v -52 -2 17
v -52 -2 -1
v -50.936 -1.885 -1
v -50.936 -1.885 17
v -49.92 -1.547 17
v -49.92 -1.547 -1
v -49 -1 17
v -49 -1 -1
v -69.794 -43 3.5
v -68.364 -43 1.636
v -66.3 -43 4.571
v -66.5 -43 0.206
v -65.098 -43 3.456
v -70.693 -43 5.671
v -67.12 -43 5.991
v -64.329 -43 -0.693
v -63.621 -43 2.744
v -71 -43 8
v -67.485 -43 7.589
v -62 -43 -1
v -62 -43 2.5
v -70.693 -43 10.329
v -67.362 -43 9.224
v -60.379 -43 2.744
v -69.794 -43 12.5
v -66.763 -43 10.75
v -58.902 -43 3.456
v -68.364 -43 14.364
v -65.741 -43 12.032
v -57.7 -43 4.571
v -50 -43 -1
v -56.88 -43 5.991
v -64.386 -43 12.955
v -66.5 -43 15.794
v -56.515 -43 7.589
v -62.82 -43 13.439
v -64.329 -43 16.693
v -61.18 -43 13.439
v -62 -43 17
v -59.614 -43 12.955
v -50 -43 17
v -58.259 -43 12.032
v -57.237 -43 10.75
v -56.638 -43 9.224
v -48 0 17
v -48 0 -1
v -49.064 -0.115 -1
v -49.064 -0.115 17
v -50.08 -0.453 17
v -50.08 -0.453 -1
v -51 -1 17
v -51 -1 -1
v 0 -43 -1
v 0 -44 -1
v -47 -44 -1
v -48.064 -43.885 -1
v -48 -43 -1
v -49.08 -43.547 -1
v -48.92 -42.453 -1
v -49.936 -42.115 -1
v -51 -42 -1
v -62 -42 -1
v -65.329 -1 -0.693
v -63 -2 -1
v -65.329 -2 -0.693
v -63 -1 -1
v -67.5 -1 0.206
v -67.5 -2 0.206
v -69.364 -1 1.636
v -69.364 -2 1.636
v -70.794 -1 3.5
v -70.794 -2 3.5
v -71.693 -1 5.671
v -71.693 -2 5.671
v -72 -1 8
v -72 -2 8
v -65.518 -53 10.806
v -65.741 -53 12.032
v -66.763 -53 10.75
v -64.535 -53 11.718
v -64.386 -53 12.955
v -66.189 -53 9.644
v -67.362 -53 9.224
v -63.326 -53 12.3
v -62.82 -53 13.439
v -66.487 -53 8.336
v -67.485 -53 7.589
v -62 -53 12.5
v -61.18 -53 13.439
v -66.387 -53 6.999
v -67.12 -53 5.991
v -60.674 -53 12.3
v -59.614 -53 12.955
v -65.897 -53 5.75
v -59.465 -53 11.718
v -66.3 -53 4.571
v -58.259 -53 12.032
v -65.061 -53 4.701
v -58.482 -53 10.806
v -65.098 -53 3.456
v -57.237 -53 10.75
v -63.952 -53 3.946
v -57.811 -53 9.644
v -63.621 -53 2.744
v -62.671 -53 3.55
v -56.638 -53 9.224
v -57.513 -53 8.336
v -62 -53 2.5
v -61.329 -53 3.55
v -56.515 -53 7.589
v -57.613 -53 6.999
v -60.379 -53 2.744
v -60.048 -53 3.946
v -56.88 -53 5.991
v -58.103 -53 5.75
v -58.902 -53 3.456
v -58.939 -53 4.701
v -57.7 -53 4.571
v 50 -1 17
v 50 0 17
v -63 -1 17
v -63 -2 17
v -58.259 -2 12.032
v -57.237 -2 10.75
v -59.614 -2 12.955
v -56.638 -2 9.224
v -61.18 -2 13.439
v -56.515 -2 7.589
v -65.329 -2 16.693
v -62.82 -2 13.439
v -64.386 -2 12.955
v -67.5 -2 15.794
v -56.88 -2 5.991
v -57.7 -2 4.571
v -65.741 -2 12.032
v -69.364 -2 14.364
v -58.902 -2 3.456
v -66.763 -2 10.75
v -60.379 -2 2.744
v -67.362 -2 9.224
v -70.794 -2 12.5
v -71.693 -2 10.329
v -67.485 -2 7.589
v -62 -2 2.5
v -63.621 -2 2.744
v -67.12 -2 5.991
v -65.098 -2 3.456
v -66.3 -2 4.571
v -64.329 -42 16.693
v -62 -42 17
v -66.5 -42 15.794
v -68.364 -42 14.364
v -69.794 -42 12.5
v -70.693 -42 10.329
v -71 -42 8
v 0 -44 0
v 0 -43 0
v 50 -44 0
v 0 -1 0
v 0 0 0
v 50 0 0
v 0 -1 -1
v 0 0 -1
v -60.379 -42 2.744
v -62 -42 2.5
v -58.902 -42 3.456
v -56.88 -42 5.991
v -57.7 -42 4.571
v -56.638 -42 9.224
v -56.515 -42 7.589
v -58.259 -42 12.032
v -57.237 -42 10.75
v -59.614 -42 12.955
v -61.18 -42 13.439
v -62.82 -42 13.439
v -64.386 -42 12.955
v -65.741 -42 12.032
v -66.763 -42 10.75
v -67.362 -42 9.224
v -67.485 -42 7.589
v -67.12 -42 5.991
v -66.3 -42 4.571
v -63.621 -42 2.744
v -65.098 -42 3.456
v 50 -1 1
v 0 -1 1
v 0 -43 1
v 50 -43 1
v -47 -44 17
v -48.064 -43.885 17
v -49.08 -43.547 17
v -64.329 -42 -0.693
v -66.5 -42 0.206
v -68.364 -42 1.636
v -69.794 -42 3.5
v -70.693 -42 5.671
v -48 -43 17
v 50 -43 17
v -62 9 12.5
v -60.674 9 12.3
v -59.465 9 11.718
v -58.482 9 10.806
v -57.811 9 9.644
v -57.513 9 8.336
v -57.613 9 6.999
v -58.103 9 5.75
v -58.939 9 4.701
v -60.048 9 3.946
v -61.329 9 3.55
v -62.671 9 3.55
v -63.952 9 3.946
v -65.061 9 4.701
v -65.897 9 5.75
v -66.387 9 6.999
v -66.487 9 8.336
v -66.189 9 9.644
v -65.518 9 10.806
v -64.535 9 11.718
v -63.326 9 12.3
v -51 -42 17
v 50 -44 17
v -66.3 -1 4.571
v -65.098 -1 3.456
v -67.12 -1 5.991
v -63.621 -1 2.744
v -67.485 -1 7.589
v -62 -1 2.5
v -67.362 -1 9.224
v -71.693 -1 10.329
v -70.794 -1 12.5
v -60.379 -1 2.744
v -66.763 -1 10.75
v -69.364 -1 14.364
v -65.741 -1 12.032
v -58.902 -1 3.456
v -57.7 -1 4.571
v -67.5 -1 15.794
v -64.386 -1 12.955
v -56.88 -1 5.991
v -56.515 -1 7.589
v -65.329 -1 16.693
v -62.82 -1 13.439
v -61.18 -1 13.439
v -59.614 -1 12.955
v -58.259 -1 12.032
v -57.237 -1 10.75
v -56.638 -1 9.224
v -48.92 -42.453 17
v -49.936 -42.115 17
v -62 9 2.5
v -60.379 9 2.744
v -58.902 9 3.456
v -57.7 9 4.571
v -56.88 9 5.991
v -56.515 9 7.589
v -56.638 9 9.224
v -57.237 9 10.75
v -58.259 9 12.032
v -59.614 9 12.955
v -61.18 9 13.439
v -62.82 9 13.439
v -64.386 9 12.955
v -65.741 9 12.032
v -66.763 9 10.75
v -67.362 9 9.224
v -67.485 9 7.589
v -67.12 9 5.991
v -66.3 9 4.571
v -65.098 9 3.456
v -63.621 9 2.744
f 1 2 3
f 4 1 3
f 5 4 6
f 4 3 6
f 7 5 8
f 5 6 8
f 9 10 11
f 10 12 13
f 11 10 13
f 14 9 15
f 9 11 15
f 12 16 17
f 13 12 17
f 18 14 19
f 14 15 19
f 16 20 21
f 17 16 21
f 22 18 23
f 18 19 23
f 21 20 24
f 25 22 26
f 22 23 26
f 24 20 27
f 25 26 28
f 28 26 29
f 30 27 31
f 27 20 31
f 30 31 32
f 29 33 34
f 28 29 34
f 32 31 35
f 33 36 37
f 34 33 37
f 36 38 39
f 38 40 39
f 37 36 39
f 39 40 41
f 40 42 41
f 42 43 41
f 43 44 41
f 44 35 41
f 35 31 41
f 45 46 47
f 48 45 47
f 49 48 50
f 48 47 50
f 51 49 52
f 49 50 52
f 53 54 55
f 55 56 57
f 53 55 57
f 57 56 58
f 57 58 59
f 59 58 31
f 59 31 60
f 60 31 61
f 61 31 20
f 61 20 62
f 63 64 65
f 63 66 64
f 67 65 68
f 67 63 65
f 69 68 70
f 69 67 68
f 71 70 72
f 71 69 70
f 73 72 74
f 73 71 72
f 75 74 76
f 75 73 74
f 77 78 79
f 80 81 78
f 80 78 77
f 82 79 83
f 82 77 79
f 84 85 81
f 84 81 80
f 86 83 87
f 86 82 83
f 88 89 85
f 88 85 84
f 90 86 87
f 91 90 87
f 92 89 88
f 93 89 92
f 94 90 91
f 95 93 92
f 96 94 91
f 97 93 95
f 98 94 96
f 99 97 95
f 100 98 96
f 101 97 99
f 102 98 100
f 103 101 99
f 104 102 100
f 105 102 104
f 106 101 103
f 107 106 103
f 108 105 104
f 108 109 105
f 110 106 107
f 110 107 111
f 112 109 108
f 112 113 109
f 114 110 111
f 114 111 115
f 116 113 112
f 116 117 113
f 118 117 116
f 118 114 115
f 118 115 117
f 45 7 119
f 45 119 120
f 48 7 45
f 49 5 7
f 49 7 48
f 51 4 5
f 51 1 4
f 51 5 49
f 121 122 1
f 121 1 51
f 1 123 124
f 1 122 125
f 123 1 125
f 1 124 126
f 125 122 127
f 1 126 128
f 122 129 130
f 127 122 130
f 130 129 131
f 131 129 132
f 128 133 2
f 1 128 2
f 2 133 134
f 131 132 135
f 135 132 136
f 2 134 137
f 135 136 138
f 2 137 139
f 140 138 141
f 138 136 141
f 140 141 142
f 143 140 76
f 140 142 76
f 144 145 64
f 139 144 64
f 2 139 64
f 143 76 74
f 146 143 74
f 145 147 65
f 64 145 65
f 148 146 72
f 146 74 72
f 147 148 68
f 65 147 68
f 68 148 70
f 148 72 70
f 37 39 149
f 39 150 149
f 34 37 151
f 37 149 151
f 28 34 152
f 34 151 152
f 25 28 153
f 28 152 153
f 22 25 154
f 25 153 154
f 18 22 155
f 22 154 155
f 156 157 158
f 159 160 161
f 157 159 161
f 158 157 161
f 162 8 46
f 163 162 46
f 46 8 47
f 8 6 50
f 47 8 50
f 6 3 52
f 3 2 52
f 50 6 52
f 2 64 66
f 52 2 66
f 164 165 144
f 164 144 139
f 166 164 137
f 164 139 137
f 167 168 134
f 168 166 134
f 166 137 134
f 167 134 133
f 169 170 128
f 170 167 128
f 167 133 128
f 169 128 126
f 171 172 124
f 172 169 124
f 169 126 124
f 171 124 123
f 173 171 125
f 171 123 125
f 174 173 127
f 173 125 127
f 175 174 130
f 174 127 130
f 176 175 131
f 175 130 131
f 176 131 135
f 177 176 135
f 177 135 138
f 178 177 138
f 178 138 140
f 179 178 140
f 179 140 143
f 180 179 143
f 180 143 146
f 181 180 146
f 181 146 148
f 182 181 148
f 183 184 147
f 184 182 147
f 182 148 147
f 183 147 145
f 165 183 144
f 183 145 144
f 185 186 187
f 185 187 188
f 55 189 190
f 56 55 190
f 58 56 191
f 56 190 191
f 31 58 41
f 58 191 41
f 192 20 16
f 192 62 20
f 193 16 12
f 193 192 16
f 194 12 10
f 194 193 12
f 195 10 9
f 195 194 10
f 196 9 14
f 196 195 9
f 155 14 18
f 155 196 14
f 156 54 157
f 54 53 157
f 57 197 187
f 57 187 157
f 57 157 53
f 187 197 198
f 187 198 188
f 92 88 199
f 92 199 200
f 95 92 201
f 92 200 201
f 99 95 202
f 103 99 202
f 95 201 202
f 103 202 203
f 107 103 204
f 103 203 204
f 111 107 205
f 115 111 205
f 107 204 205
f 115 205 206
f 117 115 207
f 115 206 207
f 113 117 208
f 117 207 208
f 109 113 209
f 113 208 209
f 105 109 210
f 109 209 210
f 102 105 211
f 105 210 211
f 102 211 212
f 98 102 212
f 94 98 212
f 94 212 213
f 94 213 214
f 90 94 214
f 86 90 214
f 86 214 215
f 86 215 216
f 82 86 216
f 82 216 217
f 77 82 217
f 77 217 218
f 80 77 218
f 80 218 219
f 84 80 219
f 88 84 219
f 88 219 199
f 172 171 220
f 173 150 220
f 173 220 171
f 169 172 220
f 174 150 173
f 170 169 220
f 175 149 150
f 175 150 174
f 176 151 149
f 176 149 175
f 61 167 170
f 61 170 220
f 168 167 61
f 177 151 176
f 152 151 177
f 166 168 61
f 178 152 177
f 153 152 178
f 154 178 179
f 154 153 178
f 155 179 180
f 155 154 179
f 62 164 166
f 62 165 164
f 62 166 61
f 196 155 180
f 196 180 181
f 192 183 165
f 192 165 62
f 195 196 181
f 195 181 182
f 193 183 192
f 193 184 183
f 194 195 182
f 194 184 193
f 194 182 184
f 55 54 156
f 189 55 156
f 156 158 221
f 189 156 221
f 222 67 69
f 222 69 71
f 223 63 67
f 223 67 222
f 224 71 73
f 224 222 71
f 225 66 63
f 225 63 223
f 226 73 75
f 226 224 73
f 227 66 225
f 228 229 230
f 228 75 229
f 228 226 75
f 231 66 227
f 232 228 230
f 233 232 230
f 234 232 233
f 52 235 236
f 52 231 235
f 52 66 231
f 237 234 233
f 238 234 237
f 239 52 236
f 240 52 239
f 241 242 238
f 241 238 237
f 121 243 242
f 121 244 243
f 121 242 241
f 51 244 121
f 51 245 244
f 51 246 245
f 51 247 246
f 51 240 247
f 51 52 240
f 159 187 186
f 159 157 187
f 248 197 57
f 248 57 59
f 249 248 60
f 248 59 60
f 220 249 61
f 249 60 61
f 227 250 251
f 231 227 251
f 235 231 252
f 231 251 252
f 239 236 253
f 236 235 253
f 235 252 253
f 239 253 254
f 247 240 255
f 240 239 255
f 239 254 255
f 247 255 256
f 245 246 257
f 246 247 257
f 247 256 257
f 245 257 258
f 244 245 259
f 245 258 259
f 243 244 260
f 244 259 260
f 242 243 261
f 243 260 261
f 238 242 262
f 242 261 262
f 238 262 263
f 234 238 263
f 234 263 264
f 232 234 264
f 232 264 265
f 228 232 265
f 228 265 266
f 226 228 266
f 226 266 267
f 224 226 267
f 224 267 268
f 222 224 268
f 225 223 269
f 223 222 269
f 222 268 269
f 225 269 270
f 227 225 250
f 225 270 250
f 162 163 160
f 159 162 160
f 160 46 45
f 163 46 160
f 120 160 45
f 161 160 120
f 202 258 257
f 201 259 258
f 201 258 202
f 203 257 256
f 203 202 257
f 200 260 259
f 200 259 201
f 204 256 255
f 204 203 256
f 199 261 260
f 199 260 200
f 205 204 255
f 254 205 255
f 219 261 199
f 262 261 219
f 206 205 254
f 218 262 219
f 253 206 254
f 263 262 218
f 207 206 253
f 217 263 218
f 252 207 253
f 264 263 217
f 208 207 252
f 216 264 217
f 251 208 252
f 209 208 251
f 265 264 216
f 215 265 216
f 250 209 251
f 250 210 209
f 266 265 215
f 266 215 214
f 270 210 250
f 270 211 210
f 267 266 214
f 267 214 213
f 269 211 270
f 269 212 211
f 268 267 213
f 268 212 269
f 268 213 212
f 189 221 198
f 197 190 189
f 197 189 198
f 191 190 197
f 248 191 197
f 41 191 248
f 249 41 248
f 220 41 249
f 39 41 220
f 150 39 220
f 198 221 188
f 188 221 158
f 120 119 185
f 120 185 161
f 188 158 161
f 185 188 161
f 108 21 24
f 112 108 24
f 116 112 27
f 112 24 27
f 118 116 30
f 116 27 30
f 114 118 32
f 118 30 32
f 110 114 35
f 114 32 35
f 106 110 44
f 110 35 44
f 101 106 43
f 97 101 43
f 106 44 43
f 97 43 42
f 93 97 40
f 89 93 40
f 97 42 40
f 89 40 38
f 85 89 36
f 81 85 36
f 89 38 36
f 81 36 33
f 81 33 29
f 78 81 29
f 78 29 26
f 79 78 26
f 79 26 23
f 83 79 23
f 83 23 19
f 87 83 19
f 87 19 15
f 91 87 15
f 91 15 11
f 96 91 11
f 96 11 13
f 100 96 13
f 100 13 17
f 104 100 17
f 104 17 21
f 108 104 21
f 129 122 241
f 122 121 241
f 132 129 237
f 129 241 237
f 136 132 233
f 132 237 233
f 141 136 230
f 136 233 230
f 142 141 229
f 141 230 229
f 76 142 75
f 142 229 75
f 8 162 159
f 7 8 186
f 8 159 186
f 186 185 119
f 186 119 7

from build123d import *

# Parameters (mm, degrees)
CROQUIS1_W                    = 50
CROQUIS1_H                    = 44
SALIENTE_EXTRUIR1_DEPTH       = 1
CROQUIS2_W                    = 50
CROQUIS2_H                    = 1
SALIENTE_EXTRUIR2_DEPTH       = 16
CROQUIS3_W                    = 1
CROQUIS3_H                    = 1
SALIENTE_EXTRUIR3_DEPTH       = 50
CROQUIS4_W                    = 1
CROQUIS4_H                    = 18
SALIENTE_EXTRUIR4_DEPTH       = 1
CROQUIS6_W                    = 1
CROQUIS6_H                    = 18
SALIENTE_EXTRUIR5_DEPTH       = 1
CROQUIS12_W                   = 1
CROQUIS12_H                   = 18
SALIENTE_EXTRUIR11_DEPTH      = 1
CROQUIS13_W                   = 18
CROQUIS13_H                   = 1
SALIENTE_EXTRUIR12_DEPTH      = 21
CROQUIS14_W                   = 18
CROQUIS14_H                   = 1
SALIENTE_EXTRUIR13_DEPTH      = 21
REDONDEO4_R                   = 9
REDONDEO5_R                   = 9
CROQUIS15_W                   = 18
CROQUIS15_H                   = 1
SALIENTE_EXTRUIR14_DEPTH      = 1
CROQUIS16_W                   = 18
CROQUIS16_H                   = 1
SALIENTE_EXTRUIR15_DEPTH      = 1
REDONDEO6_R                   = 5
REDONDEO7_R                   = 5
SALIENTE_EXTRUIR22_DEPTH      = 10
SALIENTE_EXTRUIR22_DEPTH_BACK = 54
CROQUIS17_R                   = 5.5
CORTAR_EXTRUIR5_START         = -2
CROQUIS25_R                   = 5.5
CORTAR_EXTRUIR5_DEPTH         = 2
CROQUIS26_R                   = 4.5
CORTAR_EXTRUIR6_DEPTH         = 97.524608261


# Some blends are built 0.0001 mm under size
with BuildPart() as part:
    # Croquis1 → Saliente-Extruir1 (new body)
    with BuildSketch(Plane.XY):
        with Locations((25, -22)):
            Rectangle(CROQUIS1_W, CROQUIS1_H)
    extrude(amount=SALIENTE_EXTRUIR1_DEPTH)

    # Croquis2 → Saliente-Extruir2 (add)
    with BuildSketch(Plane.XY.offset(1)):
        with Locations((25, -0.5)):
            Rectangle(CROQUIS2_W, CROQUIS2_H)
        with Locations((25, -43.5)):
            Rectangle(CROQUIS2_W, CROQUIS2_H)
    extrude(amount=SALIENTE_EXTRUIR2_DEPTH)

    # Croquis3 → Saliente-Extruir3 (add)
    with BuildSketch(Plane.ZY):
        Polygon((0, -44), (17, -44), (17, -43), (1, -43), (0, -43), align=None)
        with Locations((-0.5, -43.5)):
            Rectangle(CROQUIS3_W, CROQUIS3_H)
        with Locations((-0.5, -0.5)):
            Rectangle(CROQUIS3_W, CROQUIS3_H)
        Polygon((0, 0), (0, -1), (1, -1), (17, -1), (17, 0), align=None)
    extrude(amount=SALIENTE_EXTRUIR3_DEPTH)



with BuildPart() as body_2:
    # Croquis4 → Saliente-Extruir4 (new body)
    with BuildSketch(Plane.XZ.offset(1)):
        with Locations((-50.5, 8)):
            Rectangle(CROQUIS4_W, CROQUIS4_H)
    extrude(amount=SALIENTE_EXTRUIR4_DEPTH)


with BuildPart() as part_1:
    add(part.part)

    add(body_2.part)  # Saliente-Extruir5 merges body 2
    # Croquis6 → Saliente-Extruir5 (add)
    with BuildSketch(Plane(origin=(0, -1, 0), x_dir=(1, 0, 0), z_dir=(0, 1, 0))):
        with Locations((-50.5, -8)):
            Rectangle(CROQUIS6_W, CROQUIS6_H)
    extrude(amount=SALIENTE_EXTRUIR5_DEPTH)

    # Croquis12 → Saliente-Extruir11 (add)
    with BuildSketch(Plane(origin=(0, -43, 0), x_dir=(1, 0, 0), z_dir=(0, 1, 0))):
        with Locations((-49.5, -8)):
            Rectangle(CROQUIS12_W, CROQUIS12_H)
    extrude(amount=SALIENTE_EXTRUIR11_DEPTH)

    # Croquis13 → Saliente-Extruir12 (add)
    with BuildSketch(Plane.ZY.offset(50)):
        with Locations((8, -42.5)):
            Rectangle(CROQUIS13_W, CROQUIS13_H)
    extrude(amount=SALIENTE_EXTRUIR12_DEPTH)

    # Croquis14 → Saliente-Extruir13 (add)
    with BuildSketch(Plane.ZY.offset(51)):
        with Locations((8, -1.5)):
            Rectangle(CROQUIS14_W, CROQUIS14_H)
    extrude(amount=SALIENTE_EXTRUIR13_DEPTH)

    # Redondeo4
    redondeo4_edges = [part_1.edges().sort_by_distance(p)[0] for p in [
        (-72, -1.5, -1),
        (-72, -1.5, 17),
    ]]
    fillet(redondeo4_edges, radius=REDONDEO4_R - 0.0001)  # a hair under: the kernel refuses the full size

    # Redondeo5
    redondeo5_edges = [part_1.edges().sort_by_distance(p)[0] for p in [
        (-71, -42.5, -1),
        (-71, -42.5, 17),
    ]]
    fillet(redondeo5_edges, radius=REDONDEO5_R - 0.0001)  # a hair under: the kernel refuses the full size

    # Croquis15 → Saliente-Extruir14 (add)
    with BuildSketch(Plane(origin=(-49, 0, 0), x_dir=(0, 0, -1), z_dir=(1, 0, 0))):
        with Locations((-8, -42.5)):
            Rectangle(CROQUIS15_W, CROQUIS15_H)
    extrude(amount=SALIENTE_EXTRUIR14_DEPTH)

    # Croquis16 → Saliente-Extruir15 (add)
    with BuildSketch(Plane(origin=(-50, 0, 0), x_dir=(0, 0, -1), z_dir=(1, 0, 0))):
        with Locations((-8, -1.5)):
            Rectangle(CROQUIS16_W, CROQUIS16_H)
    extrude(amount=SALIENTE_EXTRUIR15_DEPTH)

    # Redondeo6
    # the kernel refuses this fillet: 5 mm, written as the material it takes off along each edge
    with BuildSketch(Plane(origin=(-48, -42, -8.5), x_dir=(-1, 0, 0), z_dir=(0, 0, 1))) as redondeo6_piece_1:
        with BuildLine():
            CenterArc((3, 5), REDONDEO6_R, 233.130102354, 36.869897646)
            Line((0, 1), (-0.06, 0.92))
            ThreePointArc((-0.06, 0.92), (-0.1, 0.5), (-0.1, 0))
            Line((-0.1, 0), (0, -0.1))
            Line((0, -0.1), (3, -0.1))
            Line((3, -0.1), (3, 0))
        make_face()
    extrude(amount=33, mode=Mode.SUBTRACT)
    with BuildSketch(Plane(origin=(-49, -2, -8.5), x_dir=(0, 1, 0), z_dir=(0, 0, 1))) as redondeo6_piece_2:
        with BuildLine():
            CenterArc((5, 3), REDONDEO6_R, 180, 36.869897646)
            Line((0, 3), (-0.1, 3))
            Line((-0.1, 3), (-0.1, 0))
            Line((-0.1, 0), (0, -0.1))
            ThreePointArc((0, -0.1), (0.5, -0.1), (0.92, -0.06))
            Line((0.92, -0.06), (1, 0))
        make_face()
    extrude(amount=33, mode=Mode.SUBTRACT)

    # Redondeo7
    # the kernel refuses this fillet: 5 mm, written as the material it takes off along each edge
    with BuildSketch(Plane(origin=(-50, -44, 24.5), x_dir=(1, 0, 0), z_dir=(0, 0, -1)), Plane(origin=(-51, 0, -8.5), x_dir=(1, 0, 0), z_dir=(0, 0, 1))) as redondeo7_piece_1:
        with BuildLine():
            CenterArc((3, -5), REDONDEO7_R, 90, 36.869897646)
            Line((0, -1), (-0.06, -0.92))
            ThreePointArc((-0.06, -0.92), (-0.1, -0.5), (-0.1, 0))
            Line((-0.1, 0), (0, 0.1))
            Line((0, 0.1), (3, 0.1))
            Line((3, 0.1), (3, 0))
        make_face()
    extrude(amount=33, mode=Mode.SUBTRACT)

    # Croquis17 → Saliente-Extruir22 (add, two sides: drawn at the far end of the back side and taken through both)
    with BuildSketch(Plane.XZ.offset(43).offset(-SALIENTE_EXTRUIR22_DEPTH_BACK)):
        with Locations(Location((-62, 8, 0), (0, 0, 270))):
            Circle(CROQUIS17_R)
    extrude(amount=SALIENTE_EXTRUIR22_DEPTH + SALIENTE_EXTRUIR22_DEPTH_BACK)

    # Croquis25 → Cortar-Extruir5 (cut)
    with BuildSketch(Plane(origin=(0, 11, 0), x_dir=(1, 0, 0), z_dir=(0, 1, 0)).offset(CORTAR_EXTRUIR5_START)):
        with Locations(Location((-62, -8, 0), (0, 0, 90))):
            Circle(CROQUIS25_R)
    extrude(amount=CORTAR_EXTRUIR5_DEPTH, mode=Mode.SUBTRACT)

    # Croquis26 → Cortar-Extruir6 (cut, through all)
    with BuildSketch(Plane(origin=(0, 9, 0), x_dir=(1, 0, 0), z_dir=(0, 1, 0))):
        with Locations(Location((-62, -8, 0), (0, 0, 270))):
            Circle(CROQUIS26_R)
    extrude(amount=-CORTAR_EXTRUIR6_DEPTH, mode=Mode.SUBTRACT)


solid = part_1.part
